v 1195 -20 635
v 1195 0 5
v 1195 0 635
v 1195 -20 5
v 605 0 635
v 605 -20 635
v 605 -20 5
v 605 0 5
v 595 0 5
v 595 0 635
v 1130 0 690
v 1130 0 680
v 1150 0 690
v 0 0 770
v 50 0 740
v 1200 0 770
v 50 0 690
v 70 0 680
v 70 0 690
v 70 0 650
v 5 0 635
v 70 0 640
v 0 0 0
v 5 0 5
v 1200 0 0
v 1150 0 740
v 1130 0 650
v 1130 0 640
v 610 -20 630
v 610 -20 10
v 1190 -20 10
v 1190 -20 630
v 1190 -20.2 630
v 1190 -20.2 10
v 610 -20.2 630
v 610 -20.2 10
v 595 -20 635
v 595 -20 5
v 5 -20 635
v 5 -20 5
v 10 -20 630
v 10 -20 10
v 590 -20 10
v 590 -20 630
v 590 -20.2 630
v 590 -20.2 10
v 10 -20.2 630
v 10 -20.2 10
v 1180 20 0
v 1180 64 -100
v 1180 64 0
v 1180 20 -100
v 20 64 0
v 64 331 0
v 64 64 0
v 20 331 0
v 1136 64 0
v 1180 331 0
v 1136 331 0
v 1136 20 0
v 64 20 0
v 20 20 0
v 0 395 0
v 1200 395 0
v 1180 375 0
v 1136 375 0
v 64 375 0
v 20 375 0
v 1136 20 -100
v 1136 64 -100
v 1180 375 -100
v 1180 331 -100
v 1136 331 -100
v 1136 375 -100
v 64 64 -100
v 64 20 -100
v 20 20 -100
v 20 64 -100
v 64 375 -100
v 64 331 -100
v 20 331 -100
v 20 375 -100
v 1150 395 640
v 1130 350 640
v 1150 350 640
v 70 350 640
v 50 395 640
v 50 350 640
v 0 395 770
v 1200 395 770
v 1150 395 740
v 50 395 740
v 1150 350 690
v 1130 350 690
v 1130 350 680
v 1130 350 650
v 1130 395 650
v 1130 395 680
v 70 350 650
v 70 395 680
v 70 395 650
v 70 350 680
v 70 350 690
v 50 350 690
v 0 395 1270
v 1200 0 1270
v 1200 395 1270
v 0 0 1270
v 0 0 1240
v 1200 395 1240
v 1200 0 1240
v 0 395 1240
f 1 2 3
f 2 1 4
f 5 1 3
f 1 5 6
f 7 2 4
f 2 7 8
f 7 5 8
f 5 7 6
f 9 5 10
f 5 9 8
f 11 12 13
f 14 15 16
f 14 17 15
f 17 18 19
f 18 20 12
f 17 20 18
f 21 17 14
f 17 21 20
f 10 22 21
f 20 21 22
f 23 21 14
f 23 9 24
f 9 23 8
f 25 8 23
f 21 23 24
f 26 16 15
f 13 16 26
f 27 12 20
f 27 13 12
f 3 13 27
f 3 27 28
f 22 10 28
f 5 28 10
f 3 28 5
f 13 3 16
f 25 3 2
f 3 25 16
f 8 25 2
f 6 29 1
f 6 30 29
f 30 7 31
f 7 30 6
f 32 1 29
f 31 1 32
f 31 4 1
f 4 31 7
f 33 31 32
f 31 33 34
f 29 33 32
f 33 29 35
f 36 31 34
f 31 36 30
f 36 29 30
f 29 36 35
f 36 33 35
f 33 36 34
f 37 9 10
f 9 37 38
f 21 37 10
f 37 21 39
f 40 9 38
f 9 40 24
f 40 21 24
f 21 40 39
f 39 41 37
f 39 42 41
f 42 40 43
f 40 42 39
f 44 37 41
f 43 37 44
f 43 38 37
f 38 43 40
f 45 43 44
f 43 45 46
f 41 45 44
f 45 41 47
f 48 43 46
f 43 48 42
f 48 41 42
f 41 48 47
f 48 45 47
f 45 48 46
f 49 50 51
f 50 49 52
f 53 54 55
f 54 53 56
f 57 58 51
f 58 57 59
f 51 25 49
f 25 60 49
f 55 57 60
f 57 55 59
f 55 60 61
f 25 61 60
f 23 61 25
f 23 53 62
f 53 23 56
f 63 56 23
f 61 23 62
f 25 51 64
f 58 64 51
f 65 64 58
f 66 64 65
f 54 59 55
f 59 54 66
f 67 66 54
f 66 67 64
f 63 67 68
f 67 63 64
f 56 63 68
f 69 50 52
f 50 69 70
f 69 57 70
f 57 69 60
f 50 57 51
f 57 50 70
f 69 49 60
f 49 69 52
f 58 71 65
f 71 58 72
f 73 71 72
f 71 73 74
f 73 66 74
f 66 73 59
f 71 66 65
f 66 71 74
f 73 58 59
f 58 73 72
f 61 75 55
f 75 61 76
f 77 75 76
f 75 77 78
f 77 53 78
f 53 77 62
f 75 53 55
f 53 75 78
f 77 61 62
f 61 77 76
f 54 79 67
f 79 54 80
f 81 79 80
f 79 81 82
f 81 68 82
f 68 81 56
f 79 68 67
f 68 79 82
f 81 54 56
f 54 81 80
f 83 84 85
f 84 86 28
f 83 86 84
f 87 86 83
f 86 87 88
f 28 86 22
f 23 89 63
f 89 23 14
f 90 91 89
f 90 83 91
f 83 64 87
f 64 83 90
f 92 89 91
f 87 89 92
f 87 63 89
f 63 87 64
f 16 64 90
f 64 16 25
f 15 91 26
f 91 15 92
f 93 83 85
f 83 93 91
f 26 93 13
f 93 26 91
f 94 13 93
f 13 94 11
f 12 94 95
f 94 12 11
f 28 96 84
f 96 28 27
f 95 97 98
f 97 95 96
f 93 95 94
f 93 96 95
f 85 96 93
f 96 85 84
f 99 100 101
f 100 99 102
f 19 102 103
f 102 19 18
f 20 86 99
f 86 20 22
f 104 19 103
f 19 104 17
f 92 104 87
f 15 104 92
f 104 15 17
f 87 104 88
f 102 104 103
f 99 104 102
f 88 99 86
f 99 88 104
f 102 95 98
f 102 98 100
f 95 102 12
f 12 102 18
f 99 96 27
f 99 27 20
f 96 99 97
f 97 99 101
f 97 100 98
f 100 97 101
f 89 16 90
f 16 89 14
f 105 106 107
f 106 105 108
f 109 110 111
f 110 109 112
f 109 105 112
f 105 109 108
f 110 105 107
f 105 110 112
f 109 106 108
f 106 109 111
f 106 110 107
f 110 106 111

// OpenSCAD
/* by andimoto
a quick and dirty script

this is just an idea for creating a small workshop table for my small flat
with some space and a working plate to pull out

this script is configurable
 */

// select if it is a one element besta or two element
bigBesta = true;
// besta with feet
feet = true;
// select if besta has round feet
roundFeet = false;

// display mod
mod = true;
// display upper
upperBase = true;


translate([0,0,0])
union()
{
  /* base */
  color("Cornsilk") cube([1200/2,395,640]);

  if(bigBesta == true)
  {
    color("Cornsilk") translate([1200/2,0,0]) cube([1200/2,395,640]);
  }
  translate([5,-20,5])
  union()
  {
    /* doors left */
    color("BurlyWood") cube([590,20,630]);
    color("Cornsilk") translate([5,-0.2,5]) cube([580,20,620]);

      if(bigBesta == true)
      {
        /* doors right */
      translate([600,0,0]){

        color("BurlyWood") cube([590,20,630]);
        color("Cornsilk") translate([5,-0.2,5]) cube([580,20,620]);
      }
    }
  }

  if(feet == true)
  {
    color("Cornsilk")
    {
      translate([20,20,-100]) feet();
      translate([20,395-44-20,-100]) feet();


      if(bigBesta == true)
      {
        translate([1200-44-20,20,-100]) feet();
        translate([1200-44-20,395-44-20,-100]) feet();
      }else{
        translate([1200/2-44-20,20,-100]) feet();
        translate([1200/2-44-20,395-44-20,-100]) feet();
      }
    }
  }
}


module feet()
{
  if(roundFeet == false)
  {
    cube([44,44,100]);
  }else{
    translate([22,22,0]) cylinder(r=22,h=100);
  }
}


if(mod == true)
{
  /* working plate on top */
  color("BurlyWood") translate([0,0,640+100]) cube([1200/2,395,30]);
  if(bigBesta == true)
  {
    color("BurlyWood") translate([1200/2,0,640+100]) cube([1200/2,395,30]);
  }

  color("BurlyWood")
  translate([0,0,640]) cube([50,395,100]);

  if(bigBesta == true)
  {
    color("BurlyWood")
    translate([1200-50,0,640]) cube([50,395,100]);

    color("Silver")
    translate([1200-50-20,0,640]) cube([20,350,50]);
  }else{
    color("BurlyWood")
    translate([1200/2-50,0,640]) cube([50,395,100]);

    color("Silver")
    translate([1200/2-50-20,0,640]) cube([20,350,50]);
  }

  translate([0,-350*$t,0])
  {
    color("Silver")
    translate([50,0,640]) cube([20,350+350*$t,50]);
    if(bigBesta == true)
    {
      color("Silver")
      translate([1200-50-20,0,640]) cube([20,350,50]);
    }else{
      color("Silver")
      translate([1200/2-50-20,0,640]) cube([20,350,50]);
    }
  }


  /* working plate in between */
  translate([0,-350*$t,0])
  {
    color("BurlyWood") translate([50+20,0,640+10]) cube([1200/2-140,395,30]);
    if(bigBesta == true)
    {
      color("BurlyWood") translate([1200/2-50-20,0,640+10]) cube([1200/2,395,30]);
    }
  }

}


if(upperBase == true)
{
  color("BurlyWood") translate([0,0,640+100+500]) cube([1200/2,395,30]);
  if(bigBesta == true)
  {
    color("BurlyWood") translate([1200/2,0,640+100+500]) cube([1200/2,395,30]);
  }
}
